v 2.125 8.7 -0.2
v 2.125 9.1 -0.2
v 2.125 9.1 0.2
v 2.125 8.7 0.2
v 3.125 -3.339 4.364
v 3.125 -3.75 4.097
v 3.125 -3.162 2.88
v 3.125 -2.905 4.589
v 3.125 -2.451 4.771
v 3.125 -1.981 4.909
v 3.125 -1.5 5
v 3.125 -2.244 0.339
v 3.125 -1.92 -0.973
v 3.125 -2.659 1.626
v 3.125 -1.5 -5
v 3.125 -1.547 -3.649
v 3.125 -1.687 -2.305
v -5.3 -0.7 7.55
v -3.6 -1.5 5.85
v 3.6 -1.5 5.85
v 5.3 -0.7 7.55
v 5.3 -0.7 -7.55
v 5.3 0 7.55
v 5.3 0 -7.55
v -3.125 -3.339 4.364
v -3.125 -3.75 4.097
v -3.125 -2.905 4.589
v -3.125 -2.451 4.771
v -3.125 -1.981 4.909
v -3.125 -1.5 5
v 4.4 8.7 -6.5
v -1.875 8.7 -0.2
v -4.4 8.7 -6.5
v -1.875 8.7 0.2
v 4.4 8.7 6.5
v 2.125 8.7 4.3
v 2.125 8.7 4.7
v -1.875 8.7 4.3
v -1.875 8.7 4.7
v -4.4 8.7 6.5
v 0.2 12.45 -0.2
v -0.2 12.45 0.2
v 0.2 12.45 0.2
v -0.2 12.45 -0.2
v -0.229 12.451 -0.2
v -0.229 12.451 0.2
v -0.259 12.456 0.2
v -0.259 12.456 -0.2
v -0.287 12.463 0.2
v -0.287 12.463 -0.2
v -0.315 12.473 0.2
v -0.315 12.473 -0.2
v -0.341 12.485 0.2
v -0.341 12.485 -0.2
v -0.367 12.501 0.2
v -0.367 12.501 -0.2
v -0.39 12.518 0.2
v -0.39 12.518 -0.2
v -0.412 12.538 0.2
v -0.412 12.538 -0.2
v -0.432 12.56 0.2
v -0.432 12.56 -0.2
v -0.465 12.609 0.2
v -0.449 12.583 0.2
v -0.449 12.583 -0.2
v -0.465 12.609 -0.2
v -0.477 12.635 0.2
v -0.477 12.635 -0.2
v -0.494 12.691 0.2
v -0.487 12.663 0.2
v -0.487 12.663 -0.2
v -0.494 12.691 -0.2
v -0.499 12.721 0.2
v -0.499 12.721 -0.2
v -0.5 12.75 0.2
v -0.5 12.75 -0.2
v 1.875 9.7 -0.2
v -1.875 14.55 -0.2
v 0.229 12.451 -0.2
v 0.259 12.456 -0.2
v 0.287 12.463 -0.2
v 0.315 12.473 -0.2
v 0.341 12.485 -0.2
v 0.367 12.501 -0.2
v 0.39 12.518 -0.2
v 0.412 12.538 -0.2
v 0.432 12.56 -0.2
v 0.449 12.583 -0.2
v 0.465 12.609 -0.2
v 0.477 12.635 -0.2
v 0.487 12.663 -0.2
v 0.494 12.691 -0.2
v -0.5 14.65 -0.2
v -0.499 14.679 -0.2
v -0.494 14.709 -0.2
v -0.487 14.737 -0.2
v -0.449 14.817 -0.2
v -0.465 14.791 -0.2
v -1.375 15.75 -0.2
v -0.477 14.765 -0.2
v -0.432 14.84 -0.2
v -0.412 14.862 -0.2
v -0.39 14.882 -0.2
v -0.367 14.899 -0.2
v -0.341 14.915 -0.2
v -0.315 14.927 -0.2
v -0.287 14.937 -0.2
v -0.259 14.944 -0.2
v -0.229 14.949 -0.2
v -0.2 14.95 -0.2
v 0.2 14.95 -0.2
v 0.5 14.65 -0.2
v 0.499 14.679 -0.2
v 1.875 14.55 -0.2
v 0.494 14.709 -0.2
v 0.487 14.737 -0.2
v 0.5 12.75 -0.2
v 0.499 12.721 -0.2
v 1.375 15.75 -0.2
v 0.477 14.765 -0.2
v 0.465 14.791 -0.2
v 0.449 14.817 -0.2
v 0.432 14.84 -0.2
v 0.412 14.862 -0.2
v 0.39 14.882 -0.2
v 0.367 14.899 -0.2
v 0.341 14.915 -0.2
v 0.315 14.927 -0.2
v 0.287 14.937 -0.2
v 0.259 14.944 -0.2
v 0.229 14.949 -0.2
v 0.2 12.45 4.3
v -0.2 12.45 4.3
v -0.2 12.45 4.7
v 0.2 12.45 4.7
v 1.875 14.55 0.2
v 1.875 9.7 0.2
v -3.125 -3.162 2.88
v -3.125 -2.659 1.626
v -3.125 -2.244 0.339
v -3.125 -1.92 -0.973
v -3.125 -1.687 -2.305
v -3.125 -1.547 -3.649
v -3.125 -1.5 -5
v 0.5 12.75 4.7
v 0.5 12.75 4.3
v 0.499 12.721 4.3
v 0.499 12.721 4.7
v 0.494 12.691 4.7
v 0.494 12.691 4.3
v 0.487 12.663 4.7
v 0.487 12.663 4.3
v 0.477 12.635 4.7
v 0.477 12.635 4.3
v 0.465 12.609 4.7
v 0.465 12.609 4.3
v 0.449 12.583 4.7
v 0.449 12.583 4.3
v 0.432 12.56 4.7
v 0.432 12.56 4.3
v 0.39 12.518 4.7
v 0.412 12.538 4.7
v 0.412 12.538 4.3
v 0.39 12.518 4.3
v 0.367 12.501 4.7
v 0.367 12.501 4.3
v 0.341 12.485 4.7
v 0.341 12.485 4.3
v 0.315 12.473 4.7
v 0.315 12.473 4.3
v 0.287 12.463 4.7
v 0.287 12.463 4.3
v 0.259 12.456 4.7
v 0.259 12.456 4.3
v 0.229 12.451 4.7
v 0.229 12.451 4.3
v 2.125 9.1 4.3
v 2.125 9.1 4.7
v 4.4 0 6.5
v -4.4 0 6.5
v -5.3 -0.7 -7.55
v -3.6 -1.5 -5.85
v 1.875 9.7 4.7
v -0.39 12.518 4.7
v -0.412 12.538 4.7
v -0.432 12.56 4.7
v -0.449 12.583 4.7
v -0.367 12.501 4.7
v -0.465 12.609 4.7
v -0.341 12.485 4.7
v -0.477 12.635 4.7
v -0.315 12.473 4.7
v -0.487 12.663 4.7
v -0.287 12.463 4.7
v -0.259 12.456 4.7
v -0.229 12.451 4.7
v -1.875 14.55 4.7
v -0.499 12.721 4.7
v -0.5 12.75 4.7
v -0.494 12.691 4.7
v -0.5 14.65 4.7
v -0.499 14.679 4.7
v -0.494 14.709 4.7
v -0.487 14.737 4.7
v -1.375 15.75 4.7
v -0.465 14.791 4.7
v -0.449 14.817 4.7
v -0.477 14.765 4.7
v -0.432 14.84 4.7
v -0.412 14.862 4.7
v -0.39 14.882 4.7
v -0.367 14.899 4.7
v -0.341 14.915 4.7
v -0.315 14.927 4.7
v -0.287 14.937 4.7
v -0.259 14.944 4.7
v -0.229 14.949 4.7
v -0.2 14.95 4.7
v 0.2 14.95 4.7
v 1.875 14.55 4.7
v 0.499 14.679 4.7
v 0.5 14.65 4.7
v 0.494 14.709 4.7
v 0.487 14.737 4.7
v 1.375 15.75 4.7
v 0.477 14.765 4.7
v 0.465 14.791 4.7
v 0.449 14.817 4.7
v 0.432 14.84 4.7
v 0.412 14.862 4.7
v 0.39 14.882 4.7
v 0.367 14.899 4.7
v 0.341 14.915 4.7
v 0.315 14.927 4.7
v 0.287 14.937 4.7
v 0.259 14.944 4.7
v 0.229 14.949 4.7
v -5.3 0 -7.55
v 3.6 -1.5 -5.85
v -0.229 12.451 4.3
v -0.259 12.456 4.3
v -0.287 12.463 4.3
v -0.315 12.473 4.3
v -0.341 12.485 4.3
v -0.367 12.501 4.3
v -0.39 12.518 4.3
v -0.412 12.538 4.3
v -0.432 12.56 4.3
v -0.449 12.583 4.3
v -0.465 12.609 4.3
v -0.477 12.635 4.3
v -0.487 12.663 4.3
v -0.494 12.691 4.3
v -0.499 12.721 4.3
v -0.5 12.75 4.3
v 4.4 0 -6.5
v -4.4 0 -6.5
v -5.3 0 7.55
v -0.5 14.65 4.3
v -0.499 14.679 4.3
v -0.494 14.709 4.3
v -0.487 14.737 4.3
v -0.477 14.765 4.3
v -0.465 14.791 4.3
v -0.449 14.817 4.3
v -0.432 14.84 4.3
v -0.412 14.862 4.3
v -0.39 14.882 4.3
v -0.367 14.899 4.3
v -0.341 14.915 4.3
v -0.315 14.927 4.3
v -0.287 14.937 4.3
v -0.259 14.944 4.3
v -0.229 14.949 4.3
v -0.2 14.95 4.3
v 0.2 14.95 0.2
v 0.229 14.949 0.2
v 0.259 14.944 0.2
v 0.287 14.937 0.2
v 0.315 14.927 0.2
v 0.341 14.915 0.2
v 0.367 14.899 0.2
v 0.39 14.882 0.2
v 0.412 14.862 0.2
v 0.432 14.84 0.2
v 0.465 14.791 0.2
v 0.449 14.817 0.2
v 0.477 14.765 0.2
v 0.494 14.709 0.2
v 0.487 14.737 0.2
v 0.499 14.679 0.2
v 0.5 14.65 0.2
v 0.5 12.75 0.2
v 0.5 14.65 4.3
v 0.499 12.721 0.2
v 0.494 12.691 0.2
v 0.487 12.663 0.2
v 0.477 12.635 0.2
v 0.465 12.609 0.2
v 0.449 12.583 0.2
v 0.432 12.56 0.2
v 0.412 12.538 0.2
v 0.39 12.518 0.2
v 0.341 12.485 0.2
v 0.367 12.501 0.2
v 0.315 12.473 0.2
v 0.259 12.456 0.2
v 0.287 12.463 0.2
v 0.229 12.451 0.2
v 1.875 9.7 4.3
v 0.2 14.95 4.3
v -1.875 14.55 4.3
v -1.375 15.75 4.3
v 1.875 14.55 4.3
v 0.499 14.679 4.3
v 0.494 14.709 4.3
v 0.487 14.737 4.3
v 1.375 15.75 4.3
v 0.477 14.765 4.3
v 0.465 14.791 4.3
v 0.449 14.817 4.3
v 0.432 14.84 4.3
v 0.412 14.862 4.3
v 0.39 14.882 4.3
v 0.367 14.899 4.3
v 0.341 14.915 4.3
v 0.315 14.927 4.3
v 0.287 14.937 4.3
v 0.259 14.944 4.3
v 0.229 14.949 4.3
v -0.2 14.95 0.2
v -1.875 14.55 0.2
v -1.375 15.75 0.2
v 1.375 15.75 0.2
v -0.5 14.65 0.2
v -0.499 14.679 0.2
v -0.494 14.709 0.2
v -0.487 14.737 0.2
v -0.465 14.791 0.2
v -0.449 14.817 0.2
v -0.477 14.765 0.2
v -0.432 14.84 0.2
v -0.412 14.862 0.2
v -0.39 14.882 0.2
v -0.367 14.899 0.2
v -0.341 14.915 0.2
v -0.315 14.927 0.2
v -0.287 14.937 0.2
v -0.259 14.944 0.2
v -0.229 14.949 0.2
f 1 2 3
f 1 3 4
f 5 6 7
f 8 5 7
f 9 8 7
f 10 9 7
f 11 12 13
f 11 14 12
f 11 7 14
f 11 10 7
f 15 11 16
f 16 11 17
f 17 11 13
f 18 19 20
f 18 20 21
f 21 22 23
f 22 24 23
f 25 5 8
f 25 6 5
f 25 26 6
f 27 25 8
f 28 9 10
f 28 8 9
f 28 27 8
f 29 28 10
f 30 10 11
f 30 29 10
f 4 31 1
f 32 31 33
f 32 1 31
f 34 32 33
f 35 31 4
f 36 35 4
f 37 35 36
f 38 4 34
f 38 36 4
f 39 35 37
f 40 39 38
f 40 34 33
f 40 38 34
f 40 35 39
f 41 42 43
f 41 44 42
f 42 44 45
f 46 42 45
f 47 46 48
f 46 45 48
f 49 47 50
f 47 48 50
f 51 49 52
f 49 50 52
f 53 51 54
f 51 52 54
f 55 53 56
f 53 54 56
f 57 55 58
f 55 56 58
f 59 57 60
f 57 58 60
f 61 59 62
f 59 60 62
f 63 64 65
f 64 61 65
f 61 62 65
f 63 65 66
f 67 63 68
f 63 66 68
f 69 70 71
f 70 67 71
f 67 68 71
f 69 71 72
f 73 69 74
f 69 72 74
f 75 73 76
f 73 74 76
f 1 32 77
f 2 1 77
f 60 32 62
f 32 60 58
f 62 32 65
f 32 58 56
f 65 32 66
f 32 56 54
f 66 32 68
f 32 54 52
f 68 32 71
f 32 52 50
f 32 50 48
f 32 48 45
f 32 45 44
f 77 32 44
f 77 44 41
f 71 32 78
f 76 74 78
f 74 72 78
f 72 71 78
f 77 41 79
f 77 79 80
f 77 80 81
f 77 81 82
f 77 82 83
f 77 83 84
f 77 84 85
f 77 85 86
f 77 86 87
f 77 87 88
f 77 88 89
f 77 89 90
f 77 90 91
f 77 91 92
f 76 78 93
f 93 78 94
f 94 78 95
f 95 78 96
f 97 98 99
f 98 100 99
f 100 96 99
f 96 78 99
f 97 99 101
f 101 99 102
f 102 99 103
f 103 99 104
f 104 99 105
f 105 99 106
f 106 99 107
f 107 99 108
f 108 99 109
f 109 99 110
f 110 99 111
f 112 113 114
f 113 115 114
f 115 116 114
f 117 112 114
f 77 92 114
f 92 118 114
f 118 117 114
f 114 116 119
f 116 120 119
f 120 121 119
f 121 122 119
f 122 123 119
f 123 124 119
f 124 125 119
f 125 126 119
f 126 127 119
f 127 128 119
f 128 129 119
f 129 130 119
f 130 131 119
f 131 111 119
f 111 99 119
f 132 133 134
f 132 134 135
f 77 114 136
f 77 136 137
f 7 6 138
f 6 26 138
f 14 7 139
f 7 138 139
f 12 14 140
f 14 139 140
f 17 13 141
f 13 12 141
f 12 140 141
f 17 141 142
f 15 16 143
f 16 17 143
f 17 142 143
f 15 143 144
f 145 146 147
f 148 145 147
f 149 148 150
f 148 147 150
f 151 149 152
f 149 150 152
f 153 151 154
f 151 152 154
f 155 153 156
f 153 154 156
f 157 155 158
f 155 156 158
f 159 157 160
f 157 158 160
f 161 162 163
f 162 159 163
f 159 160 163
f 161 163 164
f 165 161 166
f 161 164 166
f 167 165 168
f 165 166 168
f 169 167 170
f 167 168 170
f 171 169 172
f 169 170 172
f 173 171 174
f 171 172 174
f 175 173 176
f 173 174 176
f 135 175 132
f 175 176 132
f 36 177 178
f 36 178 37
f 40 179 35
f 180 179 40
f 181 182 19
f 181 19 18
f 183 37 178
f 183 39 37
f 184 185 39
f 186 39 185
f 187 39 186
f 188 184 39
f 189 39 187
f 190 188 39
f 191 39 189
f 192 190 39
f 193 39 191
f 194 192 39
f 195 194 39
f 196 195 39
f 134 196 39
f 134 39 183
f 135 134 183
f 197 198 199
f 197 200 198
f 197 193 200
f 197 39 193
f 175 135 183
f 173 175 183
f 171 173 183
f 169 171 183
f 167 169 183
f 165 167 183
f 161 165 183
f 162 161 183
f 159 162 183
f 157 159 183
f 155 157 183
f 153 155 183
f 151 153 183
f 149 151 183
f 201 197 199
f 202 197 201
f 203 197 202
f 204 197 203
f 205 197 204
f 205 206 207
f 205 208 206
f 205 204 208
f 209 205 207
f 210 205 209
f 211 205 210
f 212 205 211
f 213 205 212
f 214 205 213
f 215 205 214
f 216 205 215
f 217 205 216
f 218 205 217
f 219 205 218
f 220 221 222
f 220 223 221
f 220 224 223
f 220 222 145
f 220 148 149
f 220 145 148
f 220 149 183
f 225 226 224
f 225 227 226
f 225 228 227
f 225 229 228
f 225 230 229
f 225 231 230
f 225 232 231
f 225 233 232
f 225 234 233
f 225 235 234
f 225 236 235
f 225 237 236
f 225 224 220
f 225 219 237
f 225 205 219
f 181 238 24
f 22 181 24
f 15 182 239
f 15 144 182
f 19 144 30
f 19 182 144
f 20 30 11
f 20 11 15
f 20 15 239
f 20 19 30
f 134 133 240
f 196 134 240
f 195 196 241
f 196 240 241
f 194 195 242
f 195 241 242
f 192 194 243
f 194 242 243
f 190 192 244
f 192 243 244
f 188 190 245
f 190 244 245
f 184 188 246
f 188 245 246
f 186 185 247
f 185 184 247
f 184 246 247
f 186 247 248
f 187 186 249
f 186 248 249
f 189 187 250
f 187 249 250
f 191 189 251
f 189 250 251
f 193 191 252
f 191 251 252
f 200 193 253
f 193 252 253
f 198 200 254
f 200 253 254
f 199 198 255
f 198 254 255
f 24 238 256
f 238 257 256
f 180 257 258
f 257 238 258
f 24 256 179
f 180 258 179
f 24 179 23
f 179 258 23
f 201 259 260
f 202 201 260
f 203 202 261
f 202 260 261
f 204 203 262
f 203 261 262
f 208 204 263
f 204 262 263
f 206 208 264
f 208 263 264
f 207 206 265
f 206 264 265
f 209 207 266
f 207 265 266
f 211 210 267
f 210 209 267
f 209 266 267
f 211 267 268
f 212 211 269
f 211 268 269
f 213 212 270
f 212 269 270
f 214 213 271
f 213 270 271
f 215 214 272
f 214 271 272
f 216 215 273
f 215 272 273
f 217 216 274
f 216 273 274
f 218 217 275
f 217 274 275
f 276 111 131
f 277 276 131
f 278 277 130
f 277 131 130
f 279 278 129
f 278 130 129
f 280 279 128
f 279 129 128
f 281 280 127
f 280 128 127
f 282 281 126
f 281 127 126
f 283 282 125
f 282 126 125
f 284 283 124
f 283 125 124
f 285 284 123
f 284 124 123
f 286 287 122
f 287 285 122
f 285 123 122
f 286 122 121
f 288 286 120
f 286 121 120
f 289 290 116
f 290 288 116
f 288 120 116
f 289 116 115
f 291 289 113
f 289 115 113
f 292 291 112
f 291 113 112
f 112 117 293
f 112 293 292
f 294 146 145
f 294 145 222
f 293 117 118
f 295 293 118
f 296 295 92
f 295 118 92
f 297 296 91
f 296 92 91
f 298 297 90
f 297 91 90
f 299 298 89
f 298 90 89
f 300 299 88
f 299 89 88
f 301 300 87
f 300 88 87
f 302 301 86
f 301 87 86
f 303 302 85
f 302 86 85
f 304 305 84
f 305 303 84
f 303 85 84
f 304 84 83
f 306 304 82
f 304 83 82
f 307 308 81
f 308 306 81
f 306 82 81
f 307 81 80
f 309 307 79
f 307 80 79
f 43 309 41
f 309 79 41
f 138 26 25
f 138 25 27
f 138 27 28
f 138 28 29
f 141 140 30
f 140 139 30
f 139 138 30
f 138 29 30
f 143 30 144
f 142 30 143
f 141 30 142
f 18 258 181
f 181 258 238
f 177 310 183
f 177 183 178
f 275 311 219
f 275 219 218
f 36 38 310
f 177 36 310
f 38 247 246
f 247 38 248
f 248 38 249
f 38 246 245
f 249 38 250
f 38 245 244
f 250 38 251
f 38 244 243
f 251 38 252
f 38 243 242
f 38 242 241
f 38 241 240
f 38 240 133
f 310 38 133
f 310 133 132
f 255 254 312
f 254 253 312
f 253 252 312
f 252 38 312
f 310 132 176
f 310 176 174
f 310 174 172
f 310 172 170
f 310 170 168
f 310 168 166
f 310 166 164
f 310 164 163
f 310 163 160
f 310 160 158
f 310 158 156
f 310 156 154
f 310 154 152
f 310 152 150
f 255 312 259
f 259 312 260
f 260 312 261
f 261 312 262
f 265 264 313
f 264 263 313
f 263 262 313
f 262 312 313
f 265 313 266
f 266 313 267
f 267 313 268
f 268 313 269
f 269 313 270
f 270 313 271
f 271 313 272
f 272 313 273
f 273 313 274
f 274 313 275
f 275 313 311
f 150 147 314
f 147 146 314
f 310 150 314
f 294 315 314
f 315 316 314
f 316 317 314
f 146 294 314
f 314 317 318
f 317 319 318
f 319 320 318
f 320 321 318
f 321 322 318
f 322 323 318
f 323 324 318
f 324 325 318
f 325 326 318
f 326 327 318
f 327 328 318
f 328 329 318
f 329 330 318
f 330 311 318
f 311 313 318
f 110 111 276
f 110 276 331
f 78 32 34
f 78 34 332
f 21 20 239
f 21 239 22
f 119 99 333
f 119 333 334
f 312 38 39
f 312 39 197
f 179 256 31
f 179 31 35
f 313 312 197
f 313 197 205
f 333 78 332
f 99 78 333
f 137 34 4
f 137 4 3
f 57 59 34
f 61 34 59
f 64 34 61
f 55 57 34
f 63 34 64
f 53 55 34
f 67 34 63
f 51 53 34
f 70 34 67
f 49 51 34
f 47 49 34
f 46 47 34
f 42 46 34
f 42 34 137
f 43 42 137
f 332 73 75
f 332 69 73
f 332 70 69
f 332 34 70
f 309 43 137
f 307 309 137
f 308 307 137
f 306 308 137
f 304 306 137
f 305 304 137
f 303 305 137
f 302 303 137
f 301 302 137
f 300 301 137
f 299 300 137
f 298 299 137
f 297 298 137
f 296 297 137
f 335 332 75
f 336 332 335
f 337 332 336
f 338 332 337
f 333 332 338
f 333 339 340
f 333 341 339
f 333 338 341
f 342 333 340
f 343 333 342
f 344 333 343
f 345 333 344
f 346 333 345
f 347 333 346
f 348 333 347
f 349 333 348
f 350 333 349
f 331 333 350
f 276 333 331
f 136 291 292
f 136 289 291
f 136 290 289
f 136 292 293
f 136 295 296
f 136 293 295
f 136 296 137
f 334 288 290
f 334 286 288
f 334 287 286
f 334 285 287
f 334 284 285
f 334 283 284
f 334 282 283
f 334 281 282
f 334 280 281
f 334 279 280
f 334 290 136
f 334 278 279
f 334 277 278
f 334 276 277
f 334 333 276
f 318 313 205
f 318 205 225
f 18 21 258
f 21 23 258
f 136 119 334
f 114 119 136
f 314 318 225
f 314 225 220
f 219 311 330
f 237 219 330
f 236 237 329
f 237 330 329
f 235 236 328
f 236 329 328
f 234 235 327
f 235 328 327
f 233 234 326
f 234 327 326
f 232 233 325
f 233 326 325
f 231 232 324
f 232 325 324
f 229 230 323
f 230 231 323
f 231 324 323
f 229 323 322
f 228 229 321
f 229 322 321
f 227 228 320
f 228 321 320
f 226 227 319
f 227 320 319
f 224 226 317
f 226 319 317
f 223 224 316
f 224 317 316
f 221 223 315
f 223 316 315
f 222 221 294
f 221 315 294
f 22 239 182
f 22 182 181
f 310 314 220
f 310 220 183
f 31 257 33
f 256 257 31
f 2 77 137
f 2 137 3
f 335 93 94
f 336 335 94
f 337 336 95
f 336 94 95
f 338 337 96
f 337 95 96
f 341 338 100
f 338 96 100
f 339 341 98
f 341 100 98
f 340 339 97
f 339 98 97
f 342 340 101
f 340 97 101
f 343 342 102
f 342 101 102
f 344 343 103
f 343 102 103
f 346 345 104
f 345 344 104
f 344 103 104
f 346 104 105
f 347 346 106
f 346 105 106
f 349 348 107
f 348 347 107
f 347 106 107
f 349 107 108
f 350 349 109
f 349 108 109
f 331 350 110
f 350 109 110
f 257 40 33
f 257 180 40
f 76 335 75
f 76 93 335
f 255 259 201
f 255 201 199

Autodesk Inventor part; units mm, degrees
ref_plane "YZ Plane" through (0, 0, 0) normal (1, 0, 0) x (0, 1, 0)
ref_plane "XZ Plane" through (0, 0, 0) normal (0, 1, 0) x (-1, 0, 0)
sketch "スケッチ1" plane through (0, 0, 0) normal (0, 1, 0) x (-1, 0, 0)
  line L0 (4.4, -6.5) -> (-4.4, -6.5)
  line L1 (-4.4, -6.5) -> (-4.4, 6.5)
  line L2 (-4.4, 6.5) -> (4.4, 6.5)
  line L3 (4.4, 6.5) -> (4.4, -6.5)
  line L4 (-4.4, 0) -> (0, 0) construction
  line L5 (0, 0) -> (0, -6.5) construction
  dimension "d0" = 13
  dimension "d1" = 8.8
extrude "押し出し1" add sketch "スケッチ1" along normal blind 8.7
sketch "スケッチ2" plane through (0, 0, 0) normal (0, -1, 0) x (1, 0, 0)
  line L0 (5.3, 7.55) -> (-5.3, 7.55)
  line L1 (-5.3, 7.55) -> (-5.3, -7.55)
  line L2 (-5.3, -7.55) -> (5.3, -7.55)
  line L3 (5.3, -7.55) -> (5.3, 7.55)
  line L4 (5.3, 0) -> (0, 0) construction
  line L5 (0, 0) -> (0, -7.55) construction
  dimension "d4" = 15.1
  dimension "d5" = 10.6
extrude "押し出し2" add sketch "スケッチ2" along normal blind 1.5
sketch "スケッチ3" plane through (0, 0, 0) normal (0, 0, 1) x (1, 0, 0)
  line L0 (5.3, -1.5) -> (-5.3, -1.5) construction
  line L1 (-5.3, -1.5) -> (-5.3, -0.7)
  line L2 (-5.3, 0) -> (-5.3, -1.5) construction
  line L3 (-5.3, -0.7) -> (-3.6, -1.5)
  line L4 (-3.6, -1.5) -> (-5.3, -1.5)
  point P0 (0, 0)
  dimension "d8" = 1.7
  dimension "d9" = 0.8
sketch "スケッチ4" plane through (0, -1.5, 0) normal (0, -1, 0) x (1, 0, 0)
  line L0 (5.3, 7.55) -> (-5.3, 7.55) construction
  line L1 (-5.3, 7.55) -> (-5.3, -7.55) construction
  line L2 (-5.3, -7.55) -> (5.3, -7.55) construction
  line L3 (5.3, -7.55) -> (5.3, 7.55) construction
  line L4 (-3.6, 5.85) -> (3.6, 5.85)
  line L5 (3.6, 5.85) -> (3.6, -5.85)
  line L6 (3.6, -5.85) -> (-3.6, -5.85)
  line L7 (-3.6, -5.85) -> (-3.6, 5.85)
  point P0 (0, 0)
  dimension "d10" = 1.7
sweep "スイープ1" cut profiles "スケッチ3" path "スケッチ4"
sketch "スケッチ5" plane through (0, 0, 0) normal (1, 0, 0) x (0, 1, 0)
  line L0 (-1.5, 5.85) -> (-1.5, -5.85) construction
  arc A0 (-1.5, -5) -> (-3.75, 4.0973) centre (-21.0161, -5) ccw
  line L1 (-1.5, 5) -> (-1.5, -5)
  line L2 (-21.0161, -5) -> (-1.5, -5) construction
  arc A1 (-1.5, 5) -> (-3.75, 4.0973) centre (-0.8, 0) ccw
  line L3 (-0.8, 0) -> (0, 0) construction
  dimension "d16" = 2.25
  dimension "d17" = 0.8
  dimension "d18" = 10
extrude "押し出し3" add sketch "スケッチ5" along normal mid plane 6.25
sketch "スケッチ6" plane through (0, 0, 0) normal (0, 0, 1) x (1, 0, 0)
  line L0 (4.4, 8.7) -> (-4.4, 8.7) construction
  line L1 (0, 8.7) -> (0, 12.8003) construction
  line L2 (-1.875, 8.7) -> (-1.875, 14.55)
  line L3 (-1.875, 14.55) -> (-1.375, 15.75)
  line L4 (-1.375, 15.75) -> (1.375, 15.75)
  line L5 (1.375, 15.75) -> (1.875, 14.55)
  line L6 (1.875, 14.55) -> (1.875, 9.7)
  line L7 (1.875, 9.7) -> (2.125, 9.1)
  line L8 (2.125, 9.1) -> (2.125, 8.7)
  line L9 (2.125, 8.7) -> (-1.875, 8.7)
  line L10 (1.875, 14.55) -> (-1.875, 14.55) construction
  line L11 (0.2, 14.95) -> (-0.2, 14.95)
  line L12 (-0.5, 14.65) -> (-0.5, 12.75)
  line L13 (-0.2, 12.45) -> (0.2, 12.45)
  line L14 (0.5, 12.75) -> (0.5, 14.65)
  arc A0 (0.5, 14.65) -> (0.2, 14.95) centre (0.2, 14.65) ccw
  arc A1 (-0.2, 14.95) -> (-0.5, 14.65) centre (-0.2, 14.65) ccw
  arc A2 (-0.5, 12.75) -> (-0.2, 12.45) centre (-0.2, 12.75) ccw
  arc A3 (0.2, 12.45) -> (0.5, 12.75) centre (0.2, 12.75) ccw
  point P0 (0, 0)
  dimension "d21" = 3.75
  dimension "d22" = 2.75
  dimension "d23" = 1.2
  dimension "d24" = 7.05
  dimension "d25" = 0.25
  dimension "d26" = 0.4
  dimension "d27" = 0.3
  dimension "d28" = 2.5
  dimension "d29" = 1
  dimension "d30" = 0.8
extrude "押し出し4" add sketch "スケッチ6" along normal mid plane 0.4
ref_plane "作業平面1" through (0, 0, 4.5) normal (0, 0, 1) x (1, 0, 0)
sketch "スケッチ7" plane through (0, 0, 4.5) normal (0, 0, 1) x (1, 0, 0)
  arc A0 (0.5, 14.65) -> (0.2, 14.95) centre (0.2, 14.65) ccw projected
  line L0 (0.2, 14.95) -> (-0.2, 14.95) projected
  arc A1 (-0.2, 14.95) -> (-0.5, 14.65) centre (-0.2, 14.65) ccw projected
  line L1 (-0.5, 14.65) -> (-0.5, 12.75) projected
  arc A2 (-0.5, 12.75) -> (-0.2, 12.45) centre (-0.2, 12.75) ccw projected
  line L2 (-0.2, 12.45) -> (0.2, 12.45) projected
  arc A3 (0.2, 12.45) -> (0.5, 12.75) centre (0.2, 12.75) ccw projected
  line L3 (0.5, 12.75) -> (0.5, 14.65) projected
  line L4 (-1.875, 8.7) -> (-1.875, 14.55) projected
  line L5 (-1.875, 14.55) -> (-1.375, 15.75) projected
  line L6 (-1.375, 15.75) -> (1.375, 15.75) projected
  line L7 (1.375, 15.75) -> (1.875, 14.55) projected
  line L8 (1.875, 14.55) -> (1.875, 9.7) projected
  line L9 (1.875, 9.7) -> (2.125, 9.1) projected
  line L10 (2.125, 9.1) -> (2.125, 8.7) projected
  line L11 (-1.875, 8.7) -> (2.125, 8.7) projected
  point P0 (0, 0)
extrude "押し出し5" add sketch "スケッチ7" along normal mid plane 0.4
properties part number "switch_6A"
